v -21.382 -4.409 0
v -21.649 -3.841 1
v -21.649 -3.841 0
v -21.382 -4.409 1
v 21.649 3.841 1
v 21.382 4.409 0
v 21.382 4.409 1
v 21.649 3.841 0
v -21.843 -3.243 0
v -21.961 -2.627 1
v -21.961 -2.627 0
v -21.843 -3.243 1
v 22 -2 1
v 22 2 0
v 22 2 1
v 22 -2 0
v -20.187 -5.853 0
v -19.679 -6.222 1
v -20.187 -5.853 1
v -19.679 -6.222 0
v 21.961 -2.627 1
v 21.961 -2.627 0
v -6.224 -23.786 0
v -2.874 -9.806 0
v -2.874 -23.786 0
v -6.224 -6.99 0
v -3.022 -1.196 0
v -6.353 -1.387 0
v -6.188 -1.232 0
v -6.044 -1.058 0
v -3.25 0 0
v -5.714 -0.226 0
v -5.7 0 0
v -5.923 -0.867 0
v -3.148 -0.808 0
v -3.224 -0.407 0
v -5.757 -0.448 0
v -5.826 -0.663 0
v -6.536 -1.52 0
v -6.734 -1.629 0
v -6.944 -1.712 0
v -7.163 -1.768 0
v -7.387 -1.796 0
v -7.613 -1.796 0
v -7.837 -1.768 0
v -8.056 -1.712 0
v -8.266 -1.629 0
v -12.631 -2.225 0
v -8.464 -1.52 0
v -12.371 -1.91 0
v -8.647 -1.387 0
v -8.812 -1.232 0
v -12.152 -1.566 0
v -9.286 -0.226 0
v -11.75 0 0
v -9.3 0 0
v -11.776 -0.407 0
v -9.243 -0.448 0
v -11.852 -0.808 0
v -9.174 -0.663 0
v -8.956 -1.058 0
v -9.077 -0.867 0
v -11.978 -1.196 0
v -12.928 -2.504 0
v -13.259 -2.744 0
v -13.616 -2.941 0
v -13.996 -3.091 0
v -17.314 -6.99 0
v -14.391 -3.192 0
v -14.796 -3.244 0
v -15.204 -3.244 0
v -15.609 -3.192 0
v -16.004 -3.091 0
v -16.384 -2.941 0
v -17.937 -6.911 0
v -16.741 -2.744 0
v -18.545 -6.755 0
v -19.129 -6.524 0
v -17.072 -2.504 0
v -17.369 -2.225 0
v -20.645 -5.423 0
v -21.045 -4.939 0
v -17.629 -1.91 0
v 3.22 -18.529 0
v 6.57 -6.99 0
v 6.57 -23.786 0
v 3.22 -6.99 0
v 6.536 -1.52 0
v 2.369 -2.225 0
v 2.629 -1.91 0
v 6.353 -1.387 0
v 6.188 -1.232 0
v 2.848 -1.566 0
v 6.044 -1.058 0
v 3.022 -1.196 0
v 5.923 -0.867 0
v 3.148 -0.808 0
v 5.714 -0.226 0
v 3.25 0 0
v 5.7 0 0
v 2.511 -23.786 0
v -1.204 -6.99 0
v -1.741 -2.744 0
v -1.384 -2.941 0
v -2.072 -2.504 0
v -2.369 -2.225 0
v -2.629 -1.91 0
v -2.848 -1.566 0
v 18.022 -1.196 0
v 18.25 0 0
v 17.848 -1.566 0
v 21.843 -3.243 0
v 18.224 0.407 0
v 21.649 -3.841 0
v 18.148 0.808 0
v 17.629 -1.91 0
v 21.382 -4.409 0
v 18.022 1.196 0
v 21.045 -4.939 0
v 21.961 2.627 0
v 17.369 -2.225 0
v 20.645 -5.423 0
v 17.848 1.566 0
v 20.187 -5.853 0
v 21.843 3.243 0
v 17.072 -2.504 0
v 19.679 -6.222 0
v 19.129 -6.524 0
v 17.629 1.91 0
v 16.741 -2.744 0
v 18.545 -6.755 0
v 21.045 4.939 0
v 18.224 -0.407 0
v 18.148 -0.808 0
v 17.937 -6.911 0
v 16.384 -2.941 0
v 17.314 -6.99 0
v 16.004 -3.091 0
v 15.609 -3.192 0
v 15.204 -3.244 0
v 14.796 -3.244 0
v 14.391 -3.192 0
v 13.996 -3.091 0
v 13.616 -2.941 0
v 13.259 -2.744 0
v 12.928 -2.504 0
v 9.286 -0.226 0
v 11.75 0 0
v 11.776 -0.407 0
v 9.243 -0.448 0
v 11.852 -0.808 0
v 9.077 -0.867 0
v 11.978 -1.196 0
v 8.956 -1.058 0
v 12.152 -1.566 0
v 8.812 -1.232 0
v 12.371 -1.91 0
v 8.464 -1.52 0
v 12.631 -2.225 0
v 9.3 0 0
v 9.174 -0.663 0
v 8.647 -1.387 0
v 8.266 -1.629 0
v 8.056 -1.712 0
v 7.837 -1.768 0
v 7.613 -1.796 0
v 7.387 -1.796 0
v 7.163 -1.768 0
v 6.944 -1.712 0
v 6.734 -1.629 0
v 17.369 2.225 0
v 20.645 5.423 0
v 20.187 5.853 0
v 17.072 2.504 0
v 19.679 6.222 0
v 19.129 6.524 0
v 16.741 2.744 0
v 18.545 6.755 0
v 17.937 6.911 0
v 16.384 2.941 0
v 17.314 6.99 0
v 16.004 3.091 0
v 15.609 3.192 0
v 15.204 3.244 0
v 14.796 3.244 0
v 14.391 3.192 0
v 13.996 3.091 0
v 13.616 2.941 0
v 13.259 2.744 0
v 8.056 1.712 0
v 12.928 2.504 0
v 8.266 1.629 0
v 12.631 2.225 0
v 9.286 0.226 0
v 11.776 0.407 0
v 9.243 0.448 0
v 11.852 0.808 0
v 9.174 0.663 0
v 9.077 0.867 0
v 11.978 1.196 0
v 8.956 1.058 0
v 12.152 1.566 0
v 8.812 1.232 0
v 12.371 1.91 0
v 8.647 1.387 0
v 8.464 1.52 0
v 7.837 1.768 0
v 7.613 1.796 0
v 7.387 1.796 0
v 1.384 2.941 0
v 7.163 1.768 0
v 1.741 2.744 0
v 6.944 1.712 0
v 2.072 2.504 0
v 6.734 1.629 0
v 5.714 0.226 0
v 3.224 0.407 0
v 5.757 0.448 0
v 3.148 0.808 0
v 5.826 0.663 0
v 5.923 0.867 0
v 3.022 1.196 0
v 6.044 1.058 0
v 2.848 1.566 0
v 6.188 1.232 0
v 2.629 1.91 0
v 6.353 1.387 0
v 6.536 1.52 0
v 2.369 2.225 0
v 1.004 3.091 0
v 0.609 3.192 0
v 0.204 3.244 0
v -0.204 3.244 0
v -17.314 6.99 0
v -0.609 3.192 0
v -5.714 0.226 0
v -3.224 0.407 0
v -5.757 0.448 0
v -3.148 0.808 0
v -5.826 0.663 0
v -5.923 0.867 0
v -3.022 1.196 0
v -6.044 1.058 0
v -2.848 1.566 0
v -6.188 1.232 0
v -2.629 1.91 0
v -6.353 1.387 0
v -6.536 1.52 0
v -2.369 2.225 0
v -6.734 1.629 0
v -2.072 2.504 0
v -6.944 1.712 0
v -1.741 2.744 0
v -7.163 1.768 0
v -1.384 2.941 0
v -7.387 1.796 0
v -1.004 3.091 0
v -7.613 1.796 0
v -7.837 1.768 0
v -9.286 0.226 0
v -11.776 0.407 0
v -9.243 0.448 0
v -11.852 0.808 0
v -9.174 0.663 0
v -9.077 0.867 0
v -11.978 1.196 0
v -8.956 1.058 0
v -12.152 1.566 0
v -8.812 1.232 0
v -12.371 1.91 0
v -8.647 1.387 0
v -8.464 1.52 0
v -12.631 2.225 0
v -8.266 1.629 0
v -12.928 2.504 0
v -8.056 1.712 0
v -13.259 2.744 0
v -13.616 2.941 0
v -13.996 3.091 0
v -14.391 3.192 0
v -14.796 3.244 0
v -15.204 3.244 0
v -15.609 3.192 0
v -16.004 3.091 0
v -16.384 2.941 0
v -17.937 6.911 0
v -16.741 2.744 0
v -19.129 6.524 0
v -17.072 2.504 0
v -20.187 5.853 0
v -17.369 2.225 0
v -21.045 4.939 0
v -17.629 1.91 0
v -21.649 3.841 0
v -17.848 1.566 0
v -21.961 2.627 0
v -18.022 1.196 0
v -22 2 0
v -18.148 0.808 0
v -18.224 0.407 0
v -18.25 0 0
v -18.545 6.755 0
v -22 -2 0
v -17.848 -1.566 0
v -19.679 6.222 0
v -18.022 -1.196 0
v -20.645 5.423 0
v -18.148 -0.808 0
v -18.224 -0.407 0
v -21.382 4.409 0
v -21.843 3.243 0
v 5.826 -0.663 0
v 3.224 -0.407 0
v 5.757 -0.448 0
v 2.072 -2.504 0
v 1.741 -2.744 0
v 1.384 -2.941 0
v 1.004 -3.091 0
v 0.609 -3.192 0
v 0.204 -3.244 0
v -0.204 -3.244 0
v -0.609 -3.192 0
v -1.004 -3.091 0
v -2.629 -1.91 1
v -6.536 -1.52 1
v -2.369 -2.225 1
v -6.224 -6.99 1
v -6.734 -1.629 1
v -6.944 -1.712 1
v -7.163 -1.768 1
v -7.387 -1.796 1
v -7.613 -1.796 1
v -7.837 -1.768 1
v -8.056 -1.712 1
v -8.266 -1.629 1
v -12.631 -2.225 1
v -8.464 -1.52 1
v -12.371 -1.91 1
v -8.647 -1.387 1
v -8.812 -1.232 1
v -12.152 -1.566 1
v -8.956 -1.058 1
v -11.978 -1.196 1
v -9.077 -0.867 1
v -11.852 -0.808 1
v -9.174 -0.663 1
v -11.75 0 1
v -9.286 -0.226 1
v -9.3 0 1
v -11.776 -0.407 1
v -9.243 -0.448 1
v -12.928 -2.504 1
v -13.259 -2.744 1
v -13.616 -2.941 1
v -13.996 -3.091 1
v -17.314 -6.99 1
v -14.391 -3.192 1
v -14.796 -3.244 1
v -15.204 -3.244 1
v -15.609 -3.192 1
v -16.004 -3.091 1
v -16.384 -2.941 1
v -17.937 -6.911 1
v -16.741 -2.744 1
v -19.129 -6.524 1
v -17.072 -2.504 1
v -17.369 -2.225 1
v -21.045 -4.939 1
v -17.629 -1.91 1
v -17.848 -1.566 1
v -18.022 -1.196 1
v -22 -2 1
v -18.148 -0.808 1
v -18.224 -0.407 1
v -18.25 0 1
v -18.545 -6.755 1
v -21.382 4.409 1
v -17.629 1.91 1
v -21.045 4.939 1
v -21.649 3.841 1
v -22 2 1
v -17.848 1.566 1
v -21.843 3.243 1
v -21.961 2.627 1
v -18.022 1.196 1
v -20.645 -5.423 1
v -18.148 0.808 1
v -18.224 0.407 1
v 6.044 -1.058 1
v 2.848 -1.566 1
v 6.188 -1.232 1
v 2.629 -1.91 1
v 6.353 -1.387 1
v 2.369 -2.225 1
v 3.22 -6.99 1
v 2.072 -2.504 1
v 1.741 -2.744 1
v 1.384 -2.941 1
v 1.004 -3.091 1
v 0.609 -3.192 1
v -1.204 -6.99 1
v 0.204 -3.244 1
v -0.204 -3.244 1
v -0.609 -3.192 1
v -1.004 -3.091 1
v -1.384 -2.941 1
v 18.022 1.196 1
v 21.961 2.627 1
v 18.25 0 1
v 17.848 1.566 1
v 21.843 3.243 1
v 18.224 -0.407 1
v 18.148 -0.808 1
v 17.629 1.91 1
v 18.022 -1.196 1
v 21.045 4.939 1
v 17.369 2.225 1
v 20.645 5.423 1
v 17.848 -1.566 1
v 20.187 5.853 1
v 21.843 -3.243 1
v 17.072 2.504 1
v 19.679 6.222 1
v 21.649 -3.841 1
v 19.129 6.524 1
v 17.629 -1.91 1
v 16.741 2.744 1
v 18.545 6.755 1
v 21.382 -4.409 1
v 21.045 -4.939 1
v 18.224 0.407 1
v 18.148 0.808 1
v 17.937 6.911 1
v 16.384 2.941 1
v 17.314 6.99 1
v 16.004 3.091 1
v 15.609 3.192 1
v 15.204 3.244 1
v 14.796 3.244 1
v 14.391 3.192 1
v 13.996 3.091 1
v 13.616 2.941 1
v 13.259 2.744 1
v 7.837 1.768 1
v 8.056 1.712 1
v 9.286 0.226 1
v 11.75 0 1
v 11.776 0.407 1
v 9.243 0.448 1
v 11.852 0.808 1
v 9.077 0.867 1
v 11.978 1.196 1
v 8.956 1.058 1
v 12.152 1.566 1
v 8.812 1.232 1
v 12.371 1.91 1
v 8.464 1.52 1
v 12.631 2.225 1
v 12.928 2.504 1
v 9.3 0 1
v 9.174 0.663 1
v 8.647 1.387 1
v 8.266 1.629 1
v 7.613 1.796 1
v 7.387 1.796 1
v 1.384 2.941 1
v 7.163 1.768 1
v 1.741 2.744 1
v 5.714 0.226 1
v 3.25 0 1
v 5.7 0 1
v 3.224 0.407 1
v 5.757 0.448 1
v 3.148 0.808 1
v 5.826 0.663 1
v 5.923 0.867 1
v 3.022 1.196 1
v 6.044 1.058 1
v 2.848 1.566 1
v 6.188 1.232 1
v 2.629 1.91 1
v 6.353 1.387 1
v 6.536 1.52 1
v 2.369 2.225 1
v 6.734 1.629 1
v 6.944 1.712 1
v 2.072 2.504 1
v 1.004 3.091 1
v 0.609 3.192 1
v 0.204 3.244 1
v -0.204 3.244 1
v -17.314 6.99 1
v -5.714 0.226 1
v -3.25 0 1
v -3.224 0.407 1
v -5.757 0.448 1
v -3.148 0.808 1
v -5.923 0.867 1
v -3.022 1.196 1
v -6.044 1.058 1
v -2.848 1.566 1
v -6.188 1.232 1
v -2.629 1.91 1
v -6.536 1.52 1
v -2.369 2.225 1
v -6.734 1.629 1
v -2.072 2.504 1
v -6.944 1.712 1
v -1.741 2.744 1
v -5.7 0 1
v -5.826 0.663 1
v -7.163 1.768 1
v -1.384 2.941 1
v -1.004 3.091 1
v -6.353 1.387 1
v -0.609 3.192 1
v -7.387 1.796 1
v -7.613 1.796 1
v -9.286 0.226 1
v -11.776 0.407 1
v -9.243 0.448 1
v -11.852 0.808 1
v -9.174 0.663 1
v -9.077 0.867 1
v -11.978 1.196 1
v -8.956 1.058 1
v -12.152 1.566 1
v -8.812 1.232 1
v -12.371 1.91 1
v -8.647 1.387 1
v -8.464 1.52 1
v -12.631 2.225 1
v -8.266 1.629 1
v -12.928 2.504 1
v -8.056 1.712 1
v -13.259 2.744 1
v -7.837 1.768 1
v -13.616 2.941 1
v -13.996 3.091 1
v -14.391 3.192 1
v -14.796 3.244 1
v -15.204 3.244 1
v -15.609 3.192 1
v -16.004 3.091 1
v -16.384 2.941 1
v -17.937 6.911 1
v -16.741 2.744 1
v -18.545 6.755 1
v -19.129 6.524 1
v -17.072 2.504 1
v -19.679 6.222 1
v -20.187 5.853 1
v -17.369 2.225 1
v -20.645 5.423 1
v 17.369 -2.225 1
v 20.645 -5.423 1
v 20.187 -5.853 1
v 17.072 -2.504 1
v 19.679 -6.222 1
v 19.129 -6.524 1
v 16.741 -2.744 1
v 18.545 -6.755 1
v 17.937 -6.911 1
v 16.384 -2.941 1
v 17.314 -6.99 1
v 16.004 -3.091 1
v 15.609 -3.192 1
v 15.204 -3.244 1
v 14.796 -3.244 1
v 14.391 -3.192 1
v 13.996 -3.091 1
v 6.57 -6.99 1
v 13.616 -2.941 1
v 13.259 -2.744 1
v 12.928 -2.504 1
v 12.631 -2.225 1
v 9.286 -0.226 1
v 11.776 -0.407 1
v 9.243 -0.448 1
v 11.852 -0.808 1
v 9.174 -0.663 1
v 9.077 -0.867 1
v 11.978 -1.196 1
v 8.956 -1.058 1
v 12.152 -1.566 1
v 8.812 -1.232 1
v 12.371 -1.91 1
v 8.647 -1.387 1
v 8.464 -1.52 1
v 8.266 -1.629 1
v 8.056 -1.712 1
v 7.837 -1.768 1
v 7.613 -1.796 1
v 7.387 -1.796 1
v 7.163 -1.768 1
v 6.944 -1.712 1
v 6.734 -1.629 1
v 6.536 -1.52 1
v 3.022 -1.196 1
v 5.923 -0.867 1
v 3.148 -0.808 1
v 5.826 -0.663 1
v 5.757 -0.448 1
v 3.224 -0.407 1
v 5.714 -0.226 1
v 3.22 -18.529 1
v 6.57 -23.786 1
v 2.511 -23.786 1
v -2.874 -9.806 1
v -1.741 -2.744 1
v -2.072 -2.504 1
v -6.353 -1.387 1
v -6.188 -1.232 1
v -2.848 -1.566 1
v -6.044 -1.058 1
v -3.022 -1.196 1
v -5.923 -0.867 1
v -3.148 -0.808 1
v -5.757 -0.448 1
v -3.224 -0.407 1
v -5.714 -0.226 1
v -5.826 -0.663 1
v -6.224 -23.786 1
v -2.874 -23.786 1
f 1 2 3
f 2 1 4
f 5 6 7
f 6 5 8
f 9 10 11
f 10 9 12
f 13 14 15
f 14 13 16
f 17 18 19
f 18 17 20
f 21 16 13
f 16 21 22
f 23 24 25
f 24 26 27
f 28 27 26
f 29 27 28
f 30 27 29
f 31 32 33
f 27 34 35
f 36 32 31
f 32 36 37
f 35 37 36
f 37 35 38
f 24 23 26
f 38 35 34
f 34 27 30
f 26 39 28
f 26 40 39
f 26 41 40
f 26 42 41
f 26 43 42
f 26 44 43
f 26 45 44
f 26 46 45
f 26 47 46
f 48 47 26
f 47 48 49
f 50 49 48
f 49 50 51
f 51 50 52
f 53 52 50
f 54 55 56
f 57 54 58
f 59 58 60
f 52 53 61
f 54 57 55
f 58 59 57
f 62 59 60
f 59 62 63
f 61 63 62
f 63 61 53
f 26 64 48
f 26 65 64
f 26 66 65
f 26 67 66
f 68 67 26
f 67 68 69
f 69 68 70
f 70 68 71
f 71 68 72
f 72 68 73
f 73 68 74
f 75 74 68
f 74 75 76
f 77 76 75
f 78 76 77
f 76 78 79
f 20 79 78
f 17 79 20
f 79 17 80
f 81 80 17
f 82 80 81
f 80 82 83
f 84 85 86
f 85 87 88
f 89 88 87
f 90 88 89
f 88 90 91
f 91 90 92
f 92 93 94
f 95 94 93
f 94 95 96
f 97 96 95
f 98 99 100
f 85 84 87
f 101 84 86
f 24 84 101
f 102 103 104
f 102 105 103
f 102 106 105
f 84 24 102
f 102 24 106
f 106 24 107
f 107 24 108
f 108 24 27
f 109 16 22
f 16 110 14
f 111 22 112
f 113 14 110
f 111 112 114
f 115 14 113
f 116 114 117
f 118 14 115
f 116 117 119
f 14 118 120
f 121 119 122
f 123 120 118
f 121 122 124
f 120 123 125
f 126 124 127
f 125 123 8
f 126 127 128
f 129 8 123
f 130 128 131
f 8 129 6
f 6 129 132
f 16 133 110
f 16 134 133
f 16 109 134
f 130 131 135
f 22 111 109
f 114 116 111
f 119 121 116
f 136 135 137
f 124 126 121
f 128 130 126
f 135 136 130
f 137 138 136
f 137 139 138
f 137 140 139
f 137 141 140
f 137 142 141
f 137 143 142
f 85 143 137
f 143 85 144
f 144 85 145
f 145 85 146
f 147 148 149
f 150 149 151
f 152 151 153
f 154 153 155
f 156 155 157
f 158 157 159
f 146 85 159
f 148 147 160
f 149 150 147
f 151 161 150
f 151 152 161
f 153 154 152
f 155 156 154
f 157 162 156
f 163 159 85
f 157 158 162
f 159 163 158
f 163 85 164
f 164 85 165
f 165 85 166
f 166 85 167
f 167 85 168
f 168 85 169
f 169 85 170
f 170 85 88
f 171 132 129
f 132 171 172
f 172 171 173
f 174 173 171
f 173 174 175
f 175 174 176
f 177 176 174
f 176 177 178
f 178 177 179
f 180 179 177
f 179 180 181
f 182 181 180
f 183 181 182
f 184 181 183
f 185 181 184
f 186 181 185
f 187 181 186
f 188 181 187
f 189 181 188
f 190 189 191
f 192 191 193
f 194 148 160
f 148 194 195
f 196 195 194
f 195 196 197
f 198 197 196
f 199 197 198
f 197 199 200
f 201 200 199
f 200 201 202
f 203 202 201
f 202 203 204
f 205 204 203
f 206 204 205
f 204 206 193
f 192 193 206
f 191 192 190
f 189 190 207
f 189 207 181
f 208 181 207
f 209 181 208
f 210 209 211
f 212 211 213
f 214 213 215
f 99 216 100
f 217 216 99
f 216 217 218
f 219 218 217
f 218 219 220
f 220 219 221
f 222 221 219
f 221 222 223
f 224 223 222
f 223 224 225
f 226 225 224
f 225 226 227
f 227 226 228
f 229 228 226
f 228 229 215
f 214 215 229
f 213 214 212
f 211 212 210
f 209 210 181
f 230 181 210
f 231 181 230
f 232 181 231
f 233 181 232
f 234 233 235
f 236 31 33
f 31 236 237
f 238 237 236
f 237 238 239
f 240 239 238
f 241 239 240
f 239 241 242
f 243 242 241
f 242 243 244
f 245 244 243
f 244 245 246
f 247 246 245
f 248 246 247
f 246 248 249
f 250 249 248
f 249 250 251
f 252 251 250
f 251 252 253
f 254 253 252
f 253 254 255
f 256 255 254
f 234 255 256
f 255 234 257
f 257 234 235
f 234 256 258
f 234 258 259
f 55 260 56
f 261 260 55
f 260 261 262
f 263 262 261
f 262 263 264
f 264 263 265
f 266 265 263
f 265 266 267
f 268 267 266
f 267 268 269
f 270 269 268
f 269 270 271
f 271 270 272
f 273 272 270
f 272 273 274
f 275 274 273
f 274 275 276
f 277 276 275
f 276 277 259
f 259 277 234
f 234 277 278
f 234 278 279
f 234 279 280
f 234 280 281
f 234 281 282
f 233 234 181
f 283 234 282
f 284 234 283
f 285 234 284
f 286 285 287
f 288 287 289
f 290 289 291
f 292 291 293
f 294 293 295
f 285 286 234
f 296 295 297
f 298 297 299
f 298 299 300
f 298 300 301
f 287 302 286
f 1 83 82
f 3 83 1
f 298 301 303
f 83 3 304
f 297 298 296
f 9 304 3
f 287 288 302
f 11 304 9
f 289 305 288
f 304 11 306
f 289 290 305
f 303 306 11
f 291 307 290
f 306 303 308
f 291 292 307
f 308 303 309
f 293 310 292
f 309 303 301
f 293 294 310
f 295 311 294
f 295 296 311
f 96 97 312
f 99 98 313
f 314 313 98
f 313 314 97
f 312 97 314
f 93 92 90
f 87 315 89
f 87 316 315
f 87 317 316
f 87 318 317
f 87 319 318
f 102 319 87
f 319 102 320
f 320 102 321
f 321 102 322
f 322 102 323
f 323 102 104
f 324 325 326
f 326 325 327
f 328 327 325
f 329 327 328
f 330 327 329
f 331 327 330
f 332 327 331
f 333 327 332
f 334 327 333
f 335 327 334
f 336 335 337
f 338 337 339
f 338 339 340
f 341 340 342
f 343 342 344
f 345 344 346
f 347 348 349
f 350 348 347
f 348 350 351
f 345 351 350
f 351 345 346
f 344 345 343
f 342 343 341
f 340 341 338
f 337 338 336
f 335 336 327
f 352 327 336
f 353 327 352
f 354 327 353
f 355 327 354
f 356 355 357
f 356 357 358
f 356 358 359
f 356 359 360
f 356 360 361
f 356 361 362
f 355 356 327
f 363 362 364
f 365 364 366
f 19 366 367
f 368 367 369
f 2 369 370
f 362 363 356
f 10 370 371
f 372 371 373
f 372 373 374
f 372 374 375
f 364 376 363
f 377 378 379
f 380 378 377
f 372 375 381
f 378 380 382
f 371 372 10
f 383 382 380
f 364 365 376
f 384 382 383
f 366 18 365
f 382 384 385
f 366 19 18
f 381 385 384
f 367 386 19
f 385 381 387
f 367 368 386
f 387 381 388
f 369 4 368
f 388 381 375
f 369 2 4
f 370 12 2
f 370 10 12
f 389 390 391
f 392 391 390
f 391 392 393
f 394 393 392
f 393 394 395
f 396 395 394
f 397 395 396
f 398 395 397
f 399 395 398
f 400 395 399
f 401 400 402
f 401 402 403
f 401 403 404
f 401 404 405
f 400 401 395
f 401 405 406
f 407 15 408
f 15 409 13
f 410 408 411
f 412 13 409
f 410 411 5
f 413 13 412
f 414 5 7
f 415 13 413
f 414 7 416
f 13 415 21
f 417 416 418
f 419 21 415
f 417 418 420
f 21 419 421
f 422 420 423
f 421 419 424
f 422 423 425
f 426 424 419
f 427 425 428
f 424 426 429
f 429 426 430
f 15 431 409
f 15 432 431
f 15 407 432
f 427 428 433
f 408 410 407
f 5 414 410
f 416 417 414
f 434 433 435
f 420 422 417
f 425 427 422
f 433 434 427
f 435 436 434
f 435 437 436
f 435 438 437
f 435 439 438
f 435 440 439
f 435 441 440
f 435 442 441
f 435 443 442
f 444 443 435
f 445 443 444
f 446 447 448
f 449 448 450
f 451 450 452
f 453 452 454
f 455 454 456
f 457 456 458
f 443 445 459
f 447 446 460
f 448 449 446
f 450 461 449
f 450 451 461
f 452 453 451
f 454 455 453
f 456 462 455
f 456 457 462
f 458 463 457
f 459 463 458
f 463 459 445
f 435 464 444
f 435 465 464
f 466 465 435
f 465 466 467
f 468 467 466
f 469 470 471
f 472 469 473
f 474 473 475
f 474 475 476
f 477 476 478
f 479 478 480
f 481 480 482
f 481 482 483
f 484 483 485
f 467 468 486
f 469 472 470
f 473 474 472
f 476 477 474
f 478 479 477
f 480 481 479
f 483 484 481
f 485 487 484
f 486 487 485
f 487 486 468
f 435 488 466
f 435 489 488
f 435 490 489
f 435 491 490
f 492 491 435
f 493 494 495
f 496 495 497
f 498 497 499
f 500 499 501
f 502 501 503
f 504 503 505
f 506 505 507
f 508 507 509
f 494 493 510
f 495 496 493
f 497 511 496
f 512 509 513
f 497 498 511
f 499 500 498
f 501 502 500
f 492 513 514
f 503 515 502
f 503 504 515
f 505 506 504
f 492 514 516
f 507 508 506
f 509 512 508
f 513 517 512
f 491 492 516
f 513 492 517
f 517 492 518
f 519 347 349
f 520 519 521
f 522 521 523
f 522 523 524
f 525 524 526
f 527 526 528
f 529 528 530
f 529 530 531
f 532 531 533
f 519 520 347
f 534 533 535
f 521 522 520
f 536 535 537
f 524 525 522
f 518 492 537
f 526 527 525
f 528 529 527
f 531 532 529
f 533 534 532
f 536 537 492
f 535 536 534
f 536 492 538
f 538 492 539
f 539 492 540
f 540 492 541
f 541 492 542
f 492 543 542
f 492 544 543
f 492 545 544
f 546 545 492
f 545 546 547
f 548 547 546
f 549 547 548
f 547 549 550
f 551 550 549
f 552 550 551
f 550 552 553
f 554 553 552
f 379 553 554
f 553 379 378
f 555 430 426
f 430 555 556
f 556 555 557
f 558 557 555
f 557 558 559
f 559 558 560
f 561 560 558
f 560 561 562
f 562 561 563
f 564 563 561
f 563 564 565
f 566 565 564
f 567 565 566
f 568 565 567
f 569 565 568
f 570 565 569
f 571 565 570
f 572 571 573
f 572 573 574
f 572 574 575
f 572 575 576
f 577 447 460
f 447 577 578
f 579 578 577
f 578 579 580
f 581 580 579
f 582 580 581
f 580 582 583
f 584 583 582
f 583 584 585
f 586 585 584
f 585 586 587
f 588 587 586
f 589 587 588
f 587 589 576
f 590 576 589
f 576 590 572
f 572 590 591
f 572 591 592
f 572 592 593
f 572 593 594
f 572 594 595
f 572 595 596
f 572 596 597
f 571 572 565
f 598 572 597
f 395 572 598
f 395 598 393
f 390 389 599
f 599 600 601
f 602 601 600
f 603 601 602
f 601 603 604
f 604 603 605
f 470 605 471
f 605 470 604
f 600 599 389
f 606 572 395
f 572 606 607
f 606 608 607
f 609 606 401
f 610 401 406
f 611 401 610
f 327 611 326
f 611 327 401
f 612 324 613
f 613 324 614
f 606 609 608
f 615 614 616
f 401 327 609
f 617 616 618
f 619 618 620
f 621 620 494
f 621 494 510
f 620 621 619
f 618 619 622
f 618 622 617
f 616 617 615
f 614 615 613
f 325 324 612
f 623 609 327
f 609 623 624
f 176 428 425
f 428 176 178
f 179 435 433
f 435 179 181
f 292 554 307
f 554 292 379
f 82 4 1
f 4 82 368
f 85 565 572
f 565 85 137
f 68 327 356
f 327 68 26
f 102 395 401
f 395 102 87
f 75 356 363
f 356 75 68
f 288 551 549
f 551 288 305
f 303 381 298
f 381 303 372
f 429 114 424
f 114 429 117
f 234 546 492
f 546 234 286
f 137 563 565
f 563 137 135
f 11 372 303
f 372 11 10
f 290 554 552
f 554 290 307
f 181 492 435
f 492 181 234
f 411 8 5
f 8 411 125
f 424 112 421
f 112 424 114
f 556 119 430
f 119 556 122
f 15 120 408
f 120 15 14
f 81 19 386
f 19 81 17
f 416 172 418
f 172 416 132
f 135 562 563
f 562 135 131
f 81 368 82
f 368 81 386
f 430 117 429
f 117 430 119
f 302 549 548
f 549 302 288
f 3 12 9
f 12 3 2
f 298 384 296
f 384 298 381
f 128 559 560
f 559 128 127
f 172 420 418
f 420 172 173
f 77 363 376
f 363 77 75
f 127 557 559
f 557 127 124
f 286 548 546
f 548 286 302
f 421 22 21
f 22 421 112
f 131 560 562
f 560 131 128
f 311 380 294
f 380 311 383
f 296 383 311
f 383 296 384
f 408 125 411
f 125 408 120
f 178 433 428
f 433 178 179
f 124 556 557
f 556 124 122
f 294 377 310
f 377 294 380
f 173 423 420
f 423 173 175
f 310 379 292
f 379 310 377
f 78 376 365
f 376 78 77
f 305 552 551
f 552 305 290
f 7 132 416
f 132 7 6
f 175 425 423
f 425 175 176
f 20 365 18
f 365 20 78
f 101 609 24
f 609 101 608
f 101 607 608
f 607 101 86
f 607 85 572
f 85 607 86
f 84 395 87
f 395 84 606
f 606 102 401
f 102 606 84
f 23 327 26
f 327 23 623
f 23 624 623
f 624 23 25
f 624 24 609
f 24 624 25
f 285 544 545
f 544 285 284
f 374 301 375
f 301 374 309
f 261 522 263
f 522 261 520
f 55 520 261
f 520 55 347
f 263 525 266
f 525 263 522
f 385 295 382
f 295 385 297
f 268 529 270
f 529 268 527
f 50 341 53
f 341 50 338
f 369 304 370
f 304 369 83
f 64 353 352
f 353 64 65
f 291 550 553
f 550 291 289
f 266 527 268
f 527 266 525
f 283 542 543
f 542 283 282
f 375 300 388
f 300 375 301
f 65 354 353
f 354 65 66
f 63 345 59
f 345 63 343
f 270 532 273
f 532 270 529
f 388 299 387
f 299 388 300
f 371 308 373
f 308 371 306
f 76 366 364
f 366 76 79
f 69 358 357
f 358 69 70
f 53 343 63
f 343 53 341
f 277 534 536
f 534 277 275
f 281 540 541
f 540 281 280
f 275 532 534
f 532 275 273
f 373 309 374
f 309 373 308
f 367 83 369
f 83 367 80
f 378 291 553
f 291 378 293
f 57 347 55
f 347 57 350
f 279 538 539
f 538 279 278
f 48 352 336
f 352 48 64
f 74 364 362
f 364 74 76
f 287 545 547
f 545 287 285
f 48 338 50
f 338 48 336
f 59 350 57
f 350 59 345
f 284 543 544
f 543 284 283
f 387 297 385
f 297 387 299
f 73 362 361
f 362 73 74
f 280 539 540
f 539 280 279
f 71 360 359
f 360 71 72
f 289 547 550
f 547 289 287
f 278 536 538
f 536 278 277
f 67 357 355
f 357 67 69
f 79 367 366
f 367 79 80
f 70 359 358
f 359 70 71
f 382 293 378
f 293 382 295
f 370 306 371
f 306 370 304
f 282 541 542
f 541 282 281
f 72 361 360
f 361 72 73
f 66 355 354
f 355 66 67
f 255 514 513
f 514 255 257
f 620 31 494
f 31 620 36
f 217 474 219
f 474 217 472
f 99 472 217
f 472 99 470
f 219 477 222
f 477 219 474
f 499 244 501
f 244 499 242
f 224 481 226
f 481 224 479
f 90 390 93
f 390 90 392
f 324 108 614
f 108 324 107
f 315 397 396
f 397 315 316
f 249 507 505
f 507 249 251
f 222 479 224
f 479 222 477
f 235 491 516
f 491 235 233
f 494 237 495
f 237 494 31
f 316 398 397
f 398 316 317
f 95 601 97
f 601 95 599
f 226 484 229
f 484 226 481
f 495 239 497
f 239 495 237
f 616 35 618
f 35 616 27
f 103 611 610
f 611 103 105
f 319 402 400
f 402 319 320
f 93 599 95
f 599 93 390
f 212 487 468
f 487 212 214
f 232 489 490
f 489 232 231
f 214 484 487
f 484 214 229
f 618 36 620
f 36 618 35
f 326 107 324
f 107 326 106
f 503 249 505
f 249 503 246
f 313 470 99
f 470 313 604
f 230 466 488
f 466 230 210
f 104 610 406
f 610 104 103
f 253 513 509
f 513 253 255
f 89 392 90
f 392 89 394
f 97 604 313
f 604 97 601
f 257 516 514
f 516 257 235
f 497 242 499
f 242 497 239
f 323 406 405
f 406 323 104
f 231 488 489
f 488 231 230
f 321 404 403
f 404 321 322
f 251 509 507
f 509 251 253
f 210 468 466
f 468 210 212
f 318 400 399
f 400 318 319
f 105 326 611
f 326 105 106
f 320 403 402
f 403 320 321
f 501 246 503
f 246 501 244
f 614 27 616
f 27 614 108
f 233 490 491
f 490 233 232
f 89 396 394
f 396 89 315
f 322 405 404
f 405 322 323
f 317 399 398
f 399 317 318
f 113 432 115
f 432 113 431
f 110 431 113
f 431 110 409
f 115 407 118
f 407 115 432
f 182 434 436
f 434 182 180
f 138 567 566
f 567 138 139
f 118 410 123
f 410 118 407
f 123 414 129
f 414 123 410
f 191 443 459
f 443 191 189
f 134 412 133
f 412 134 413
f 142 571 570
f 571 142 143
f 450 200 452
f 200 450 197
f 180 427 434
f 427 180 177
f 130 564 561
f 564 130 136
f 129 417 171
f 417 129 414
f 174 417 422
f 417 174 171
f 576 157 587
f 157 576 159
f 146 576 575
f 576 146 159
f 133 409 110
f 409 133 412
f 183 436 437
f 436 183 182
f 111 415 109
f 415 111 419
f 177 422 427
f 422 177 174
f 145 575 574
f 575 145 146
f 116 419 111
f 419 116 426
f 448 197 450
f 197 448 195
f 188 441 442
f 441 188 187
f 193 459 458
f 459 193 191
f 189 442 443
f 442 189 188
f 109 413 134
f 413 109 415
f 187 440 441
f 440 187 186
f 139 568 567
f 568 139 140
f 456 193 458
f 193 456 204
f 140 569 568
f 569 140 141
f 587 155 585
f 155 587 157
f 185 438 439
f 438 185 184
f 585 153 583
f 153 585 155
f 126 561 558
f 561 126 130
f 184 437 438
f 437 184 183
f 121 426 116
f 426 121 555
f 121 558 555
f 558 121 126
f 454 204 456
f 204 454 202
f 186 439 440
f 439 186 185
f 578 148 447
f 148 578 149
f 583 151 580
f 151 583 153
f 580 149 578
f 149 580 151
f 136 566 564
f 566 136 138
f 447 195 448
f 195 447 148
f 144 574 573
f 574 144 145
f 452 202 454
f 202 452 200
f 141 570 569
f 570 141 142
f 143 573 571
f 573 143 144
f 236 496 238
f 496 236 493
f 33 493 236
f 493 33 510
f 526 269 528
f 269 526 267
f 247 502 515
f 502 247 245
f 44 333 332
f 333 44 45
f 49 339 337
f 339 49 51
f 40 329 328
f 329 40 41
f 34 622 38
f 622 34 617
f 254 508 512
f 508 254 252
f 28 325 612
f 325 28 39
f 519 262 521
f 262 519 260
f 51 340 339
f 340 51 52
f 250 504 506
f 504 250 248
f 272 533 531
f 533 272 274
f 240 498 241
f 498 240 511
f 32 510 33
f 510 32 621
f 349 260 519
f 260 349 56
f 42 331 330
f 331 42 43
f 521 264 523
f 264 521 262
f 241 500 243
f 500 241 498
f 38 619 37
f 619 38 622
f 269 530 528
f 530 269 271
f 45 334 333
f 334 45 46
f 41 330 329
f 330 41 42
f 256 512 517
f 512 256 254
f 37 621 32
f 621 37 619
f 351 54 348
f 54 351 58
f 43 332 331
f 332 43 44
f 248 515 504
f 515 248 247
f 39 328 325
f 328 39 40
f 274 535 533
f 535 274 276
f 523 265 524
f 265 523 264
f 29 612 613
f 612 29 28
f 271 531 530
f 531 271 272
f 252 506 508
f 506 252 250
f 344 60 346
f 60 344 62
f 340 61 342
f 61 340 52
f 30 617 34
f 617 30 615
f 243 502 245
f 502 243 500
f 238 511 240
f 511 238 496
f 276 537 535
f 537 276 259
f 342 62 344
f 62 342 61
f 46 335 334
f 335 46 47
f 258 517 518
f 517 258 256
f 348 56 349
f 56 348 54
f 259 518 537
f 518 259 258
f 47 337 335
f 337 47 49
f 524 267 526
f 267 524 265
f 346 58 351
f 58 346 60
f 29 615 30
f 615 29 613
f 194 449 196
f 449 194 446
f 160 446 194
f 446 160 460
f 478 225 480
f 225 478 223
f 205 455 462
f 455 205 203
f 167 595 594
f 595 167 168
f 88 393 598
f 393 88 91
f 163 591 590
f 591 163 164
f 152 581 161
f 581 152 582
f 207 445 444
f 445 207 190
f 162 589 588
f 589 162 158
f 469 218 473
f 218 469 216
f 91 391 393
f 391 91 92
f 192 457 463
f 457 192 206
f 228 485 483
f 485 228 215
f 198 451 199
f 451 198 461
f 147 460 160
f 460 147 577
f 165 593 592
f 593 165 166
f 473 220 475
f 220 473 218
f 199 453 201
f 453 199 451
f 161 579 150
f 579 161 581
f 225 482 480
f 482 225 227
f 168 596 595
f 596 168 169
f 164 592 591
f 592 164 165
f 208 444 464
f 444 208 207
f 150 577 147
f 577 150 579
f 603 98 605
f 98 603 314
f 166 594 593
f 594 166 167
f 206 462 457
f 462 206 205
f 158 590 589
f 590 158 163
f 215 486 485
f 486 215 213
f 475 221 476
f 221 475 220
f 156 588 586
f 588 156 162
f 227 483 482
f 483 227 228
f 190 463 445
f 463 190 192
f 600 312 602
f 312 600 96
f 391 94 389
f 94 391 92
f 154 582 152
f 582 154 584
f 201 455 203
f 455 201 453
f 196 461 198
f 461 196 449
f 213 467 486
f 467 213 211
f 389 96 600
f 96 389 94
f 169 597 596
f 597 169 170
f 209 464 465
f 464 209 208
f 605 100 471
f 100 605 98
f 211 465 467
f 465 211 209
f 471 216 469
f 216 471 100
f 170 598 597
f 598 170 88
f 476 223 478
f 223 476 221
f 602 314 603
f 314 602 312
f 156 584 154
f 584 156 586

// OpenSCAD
$fn = 50;


difference() {
	union() {
		*color(alpha = 1.0000000000, c = "gray") {
			translate(v = [0, 14, 0]) {
				linear_extrude(height = 1) {
					text(font = "Arial:style=Bold", halign = "center", size = 4.5000000000, text = "COMMENT description oobb_plate_shape_p_type_1_depth_3_width_1_thickness_n_extra_oobb_size", valign = "center");
				}
			}
		}
		hull() {
			translate(v = [-17.0000000000, 2.0000000000, 0]) {
				cylinder(h = 1, r = 5);
			}
			translate(v = [17.0000000000, 2.0000000000, 0]) {
				cylinder(h = 1, r = 5);
			}
			translate(v = [-17.0000000000, -2.0000000000, 0]) {
				cylinder(h = 1, r = 5);
			}
			translate(v = [17.0000000000, -2.0000000000, 0]) {
				cylinder(h = 1, r = 5);
			}
		}
		translate(v = [0, -5, 0]) {
			linear_extrude(height = 1) {
				text(font = "DejaVu Sans Mono:style=Bold", halign = "center", size = 19.0000000000, text = "N", valign = "top");
			}
		}
	}
	union() {
		*color(alpha = 1.0000000000, c = "gray") {
			translate(v = [0, 14, 0]) {
				linear_extrude(height = 1) {
					text(font = "Arial:style=Bold", halign = "center", size = 4.5000000000, text = "COMMENT description oobb_holes_shape_n_type_3_width_1_thickness_n_extra_oobb_size_1_height_'all'_holes_true_both_holes", valign = "center");
				}
			}
		}
		translate(v = [-15.0000000000, 0.0000000000, 0]) {
			translate(v = [0, 0, -50]) {
				cylinder(h = 100, r = 3.2500000000);
			}
		}
		translate(v = [0, 0, -50]) {
			cylinder(h = 100, r = 3.2500000000);
		}
		translate(v = [15.0000000000, 0.0000000000, 0]) {
			translate(v = [0, 0, -50]) {
				cylinder(h = 100, r = 3.2500000000);
			}
		}
		translate(v = [-15.0000000000, 0.0000000000, 0]) {
			translate(v = [0, 0, -50]) {
				cylinder(h = 100, r = 1.8000000000);
			}
		}
		translate(v = [-7.5000000000, 0.0000000000, 0]) {
			translate(v = [0, 0, -50]) {
				cylinder(h = 100, r = 1.8000000000);
			}
		}
		translate(v = [0, 0, -50]) {
			cylinder(h = 100, r = 1.8000000000);
		}
		translate(v = [7.5000000000, 0.0000000000, 0]) {
			translate(v = [0, 0, -50]) {
				cylinder(h = 100, r = 1.8000000000);
			}
		}
		translate(v = [15.0000000000, 0.0000000000, 0]) {
			translate(v = [0, 0, -50]) {
				cylinder(h = 100, r = 1.8000000000);
			}
		}
	}
}
